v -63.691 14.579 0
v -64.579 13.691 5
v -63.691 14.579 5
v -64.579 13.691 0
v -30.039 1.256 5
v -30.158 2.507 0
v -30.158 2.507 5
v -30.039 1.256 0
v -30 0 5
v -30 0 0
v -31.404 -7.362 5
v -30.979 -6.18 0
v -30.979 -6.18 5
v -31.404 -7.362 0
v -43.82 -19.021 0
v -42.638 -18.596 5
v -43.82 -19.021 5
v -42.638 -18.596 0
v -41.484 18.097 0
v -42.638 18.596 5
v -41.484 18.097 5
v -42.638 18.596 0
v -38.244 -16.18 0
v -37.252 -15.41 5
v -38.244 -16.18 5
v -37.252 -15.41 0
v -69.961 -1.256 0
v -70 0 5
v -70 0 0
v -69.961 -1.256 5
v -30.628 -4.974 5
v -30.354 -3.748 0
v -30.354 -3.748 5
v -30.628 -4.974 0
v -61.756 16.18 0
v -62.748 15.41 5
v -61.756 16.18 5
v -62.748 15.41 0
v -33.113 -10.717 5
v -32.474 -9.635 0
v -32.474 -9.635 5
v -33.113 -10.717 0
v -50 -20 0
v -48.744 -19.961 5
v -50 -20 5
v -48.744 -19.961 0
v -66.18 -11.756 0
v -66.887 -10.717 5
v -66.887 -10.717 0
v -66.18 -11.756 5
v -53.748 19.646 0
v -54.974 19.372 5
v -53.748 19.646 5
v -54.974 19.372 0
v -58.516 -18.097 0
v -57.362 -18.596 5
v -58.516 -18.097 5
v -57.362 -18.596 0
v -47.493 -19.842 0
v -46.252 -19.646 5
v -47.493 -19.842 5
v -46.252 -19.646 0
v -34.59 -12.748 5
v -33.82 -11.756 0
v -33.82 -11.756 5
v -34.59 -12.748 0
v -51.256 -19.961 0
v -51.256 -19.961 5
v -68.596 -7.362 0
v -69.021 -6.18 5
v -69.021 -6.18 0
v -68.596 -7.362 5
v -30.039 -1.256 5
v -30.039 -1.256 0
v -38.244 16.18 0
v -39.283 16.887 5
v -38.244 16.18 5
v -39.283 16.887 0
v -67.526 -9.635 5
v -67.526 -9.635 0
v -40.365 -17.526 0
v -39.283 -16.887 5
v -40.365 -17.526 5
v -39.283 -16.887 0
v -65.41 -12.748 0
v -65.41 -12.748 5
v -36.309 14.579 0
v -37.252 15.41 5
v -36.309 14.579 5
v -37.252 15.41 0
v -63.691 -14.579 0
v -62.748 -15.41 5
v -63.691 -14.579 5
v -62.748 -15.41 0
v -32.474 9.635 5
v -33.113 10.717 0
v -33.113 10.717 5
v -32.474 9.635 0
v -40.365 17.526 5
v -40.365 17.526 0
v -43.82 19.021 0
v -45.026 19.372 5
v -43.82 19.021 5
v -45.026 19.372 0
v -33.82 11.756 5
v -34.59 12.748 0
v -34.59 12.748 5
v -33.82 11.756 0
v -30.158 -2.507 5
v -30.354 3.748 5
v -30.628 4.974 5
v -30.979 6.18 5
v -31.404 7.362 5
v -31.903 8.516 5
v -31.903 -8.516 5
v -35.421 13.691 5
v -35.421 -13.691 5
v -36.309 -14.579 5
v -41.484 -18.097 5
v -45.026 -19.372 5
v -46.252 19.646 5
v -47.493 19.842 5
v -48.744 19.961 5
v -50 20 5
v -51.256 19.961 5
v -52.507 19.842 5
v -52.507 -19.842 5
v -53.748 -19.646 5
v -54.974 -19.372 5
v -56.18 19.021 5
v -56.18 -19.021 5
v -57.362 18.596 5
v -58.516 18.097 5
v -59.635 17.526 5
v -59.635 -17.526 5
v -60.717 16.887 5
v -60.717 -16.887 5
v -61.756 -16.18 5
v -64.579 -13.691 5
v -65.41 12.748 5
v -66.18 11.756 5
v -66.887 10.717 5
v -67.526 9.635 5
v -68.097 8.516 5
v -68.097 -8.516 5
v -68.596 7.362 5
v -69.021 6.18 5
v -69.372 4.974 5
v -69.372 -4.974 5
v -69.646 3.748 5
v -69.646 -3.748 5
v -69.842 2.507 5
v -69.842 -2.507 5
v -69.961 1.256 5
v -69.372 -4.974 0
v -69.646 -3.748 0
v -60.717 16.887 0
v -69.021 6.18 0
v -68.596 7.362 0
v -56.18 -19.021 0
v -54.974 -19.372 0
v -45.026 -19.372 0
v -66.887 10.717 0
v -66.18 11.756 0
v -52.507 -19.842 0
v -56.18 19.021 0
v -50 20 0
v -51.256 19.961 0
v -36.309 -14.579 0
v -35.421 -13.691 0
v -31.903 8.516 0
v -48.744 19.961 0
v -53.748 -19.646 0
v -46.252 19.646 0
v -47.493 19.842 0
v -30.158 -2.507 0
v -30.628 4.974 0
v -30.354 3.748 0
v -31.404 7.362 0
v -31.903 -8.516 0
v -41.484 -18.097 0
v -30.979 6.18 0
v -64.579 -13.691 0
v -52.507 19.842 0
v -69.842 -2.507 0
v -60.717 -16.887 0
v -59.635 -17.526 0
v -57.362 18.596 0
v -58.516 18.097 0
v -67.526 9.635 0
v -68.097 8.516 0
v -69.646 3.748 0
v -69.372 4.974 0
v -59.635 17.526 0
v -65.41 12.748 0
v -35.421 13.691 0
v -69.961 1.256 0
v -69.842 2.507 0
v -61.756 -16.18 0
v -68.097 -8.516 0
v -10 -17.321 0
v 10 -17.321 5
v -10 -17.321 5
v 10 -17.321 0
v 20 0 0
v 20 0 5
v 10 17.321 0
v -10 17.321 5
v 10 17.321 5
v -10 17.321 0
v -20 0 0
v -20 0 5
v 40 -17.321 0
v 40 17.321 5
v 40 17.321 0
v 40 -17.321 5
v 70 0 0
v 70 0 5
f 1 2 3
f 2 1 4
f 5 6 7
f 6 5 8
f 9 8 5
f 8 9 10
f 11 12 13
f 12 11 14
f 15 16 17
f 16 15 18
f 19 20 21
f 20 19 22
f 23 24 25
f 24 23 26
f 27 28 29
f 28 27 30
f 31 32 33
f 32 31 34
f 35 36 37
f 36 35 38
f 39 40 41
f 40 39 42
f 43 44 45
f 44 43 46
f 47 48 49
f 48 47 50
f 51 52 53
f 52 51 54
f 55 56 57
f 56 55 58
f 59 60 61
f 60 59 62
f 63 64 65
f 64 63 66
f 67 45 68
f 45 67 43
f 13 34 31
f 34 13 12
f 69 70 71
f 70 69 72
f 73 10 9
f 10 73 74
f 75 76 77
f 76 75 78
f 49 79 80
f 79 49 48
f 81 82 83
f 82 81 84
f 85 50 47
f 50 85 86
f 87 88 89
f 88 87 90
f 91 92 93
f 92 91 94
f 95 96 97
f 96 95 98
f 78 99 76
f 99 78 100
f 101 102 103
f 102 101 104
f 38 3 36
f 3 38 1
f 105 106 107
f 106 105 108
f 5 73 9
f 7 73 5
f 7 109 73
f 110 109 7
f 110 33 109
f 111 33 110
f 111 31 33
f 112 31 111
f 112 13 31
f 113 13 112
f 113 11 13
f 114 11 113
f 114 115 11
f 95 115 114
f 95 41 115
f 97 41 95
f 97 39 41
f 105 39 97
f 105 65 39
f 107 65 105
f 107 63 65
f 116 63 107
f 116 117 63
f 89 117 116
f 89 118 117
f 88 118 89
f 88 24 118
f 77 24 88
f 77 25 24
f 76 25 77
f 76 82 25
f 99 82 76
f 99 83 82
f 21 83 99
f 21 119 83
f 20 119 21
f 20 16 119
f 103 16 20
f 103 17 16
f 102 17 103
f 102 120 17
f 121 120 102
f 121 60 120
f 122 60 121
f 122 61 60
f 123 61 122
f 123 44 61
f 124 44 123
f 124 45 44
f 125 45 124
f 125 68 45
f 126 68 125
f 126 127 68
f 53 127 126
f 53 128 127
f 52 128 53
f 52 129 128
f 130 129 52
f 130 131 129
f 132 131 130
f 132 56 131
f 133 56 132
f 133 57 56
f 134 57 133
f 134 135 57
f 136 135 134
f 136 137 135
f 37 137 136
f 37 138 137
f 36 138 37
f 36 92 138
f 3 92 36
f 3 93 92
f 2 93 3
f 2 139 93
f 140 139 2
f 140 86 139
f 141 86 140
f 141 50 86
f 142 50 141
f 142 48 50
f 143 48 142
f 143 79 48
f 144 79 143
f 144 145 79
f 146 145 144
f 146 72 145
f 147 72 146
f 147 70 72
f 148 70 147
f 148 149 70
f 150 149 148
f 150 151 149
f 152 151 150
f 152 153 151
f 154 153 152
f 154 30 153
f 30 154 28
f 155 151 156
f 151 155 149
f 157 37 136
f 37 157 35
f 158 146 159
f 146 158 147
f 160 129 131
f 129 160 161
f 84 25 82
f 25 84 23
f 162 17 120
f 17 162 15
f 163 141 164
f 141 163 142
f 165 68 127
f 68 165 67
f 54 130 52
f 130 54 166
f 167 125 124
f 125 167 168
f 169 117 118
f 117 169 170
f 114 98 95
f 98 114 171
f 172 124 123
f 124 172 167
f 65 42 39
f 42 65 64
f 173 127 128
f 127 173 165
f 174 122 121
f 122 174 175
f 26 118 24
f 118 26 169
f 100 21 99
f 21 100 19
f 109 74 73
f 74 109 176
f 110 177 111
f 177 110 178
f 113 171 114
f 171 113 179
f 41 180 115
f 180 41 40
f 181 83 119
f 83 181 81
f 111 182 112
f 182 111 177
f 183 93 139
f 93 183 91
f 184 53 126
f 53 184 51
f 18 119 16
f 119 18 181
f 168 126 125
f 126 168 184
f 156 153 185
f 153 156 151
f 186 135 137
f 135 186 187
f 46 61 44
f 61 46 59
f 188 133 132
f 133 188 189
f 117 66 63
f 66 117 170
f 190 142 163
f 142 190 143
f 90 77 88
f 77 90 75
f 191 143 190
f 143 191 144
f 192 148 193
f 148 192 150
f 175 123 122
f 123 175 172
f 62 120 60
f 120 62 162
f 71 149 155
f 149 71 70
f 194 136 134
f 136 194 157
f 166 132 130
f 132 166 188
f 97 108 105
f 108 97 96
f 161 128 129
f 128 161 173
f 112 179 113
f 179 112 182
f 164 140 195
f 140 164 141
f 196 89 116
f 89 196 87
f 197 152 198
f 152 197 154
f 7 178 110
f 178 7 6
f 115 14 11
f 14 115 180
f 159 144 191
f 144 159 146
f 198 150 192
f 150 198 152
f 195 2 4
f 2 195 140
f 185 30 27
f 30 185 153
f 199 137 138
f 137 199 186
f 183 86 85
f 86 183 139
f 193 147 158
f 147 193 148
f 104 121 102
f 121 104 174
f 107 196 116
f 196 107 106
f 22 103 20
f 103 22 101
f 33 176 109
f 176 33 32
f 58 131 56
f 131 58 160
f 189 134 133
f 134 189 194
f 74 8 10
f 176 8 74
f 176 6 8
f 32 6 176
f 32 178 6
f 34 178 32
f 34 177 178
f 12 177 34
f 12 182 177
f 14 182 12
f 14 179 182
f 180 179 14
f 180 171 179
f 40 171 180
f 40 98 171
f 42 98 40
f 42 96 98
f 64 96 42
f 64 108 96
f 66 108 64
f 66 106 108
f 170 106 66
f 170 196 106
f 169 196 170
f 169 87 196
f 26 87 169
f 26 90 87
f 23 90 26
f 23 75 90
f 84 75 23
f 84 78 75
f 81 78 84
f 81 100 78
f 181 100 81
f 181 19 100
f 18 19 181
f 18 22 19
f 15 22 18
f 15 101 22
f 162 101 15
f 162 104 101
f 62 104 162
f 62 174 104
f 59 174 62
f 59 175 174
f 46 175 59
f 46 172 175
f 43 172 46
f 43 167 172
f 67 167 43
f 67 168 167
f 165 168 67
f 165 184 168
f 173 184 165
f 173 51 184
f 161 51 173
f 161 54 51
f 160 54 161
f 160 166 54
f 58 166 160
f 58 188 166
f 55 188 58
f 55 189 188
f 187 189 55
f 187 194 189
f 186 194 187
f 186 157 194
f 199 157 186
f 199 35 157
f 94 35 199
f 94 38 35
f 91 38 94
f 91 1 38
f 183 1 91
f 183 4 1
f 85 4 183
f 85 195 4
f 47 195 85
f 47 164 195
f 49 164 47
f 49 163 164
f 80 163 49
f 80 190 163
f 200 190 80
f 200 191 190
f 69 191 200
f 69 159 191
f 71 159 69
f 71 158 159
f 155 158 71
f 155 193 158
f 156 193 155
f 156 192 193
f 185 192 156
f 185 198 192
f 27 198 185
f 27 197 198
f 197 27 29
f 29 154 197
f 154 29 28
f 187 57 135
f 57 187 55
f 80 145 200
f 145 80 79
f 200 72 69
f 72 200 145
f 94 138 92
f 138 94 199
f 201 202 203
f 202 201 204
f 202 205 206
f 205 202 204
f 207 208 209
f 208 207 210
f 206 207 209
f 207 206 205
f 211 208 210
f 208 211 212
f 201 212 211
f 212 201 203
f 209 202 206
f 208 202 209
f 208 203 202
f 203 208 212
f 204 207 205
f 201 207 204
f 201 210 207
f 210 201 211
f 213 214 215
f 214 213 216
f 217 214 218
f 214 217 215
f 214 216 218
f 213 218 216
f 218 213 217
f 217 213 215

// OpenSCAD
// --Moneda
translate([-50,0,0])
    cylinder(r=40/2,h=5,$fn=100);
    
// --Hexágono
cylinder(r=40/2,h=5,$fn=6);

// --Triángulo equilátero
translate([50,0,0])
    cylinder(r=40/2,h=5,$fn=3);
